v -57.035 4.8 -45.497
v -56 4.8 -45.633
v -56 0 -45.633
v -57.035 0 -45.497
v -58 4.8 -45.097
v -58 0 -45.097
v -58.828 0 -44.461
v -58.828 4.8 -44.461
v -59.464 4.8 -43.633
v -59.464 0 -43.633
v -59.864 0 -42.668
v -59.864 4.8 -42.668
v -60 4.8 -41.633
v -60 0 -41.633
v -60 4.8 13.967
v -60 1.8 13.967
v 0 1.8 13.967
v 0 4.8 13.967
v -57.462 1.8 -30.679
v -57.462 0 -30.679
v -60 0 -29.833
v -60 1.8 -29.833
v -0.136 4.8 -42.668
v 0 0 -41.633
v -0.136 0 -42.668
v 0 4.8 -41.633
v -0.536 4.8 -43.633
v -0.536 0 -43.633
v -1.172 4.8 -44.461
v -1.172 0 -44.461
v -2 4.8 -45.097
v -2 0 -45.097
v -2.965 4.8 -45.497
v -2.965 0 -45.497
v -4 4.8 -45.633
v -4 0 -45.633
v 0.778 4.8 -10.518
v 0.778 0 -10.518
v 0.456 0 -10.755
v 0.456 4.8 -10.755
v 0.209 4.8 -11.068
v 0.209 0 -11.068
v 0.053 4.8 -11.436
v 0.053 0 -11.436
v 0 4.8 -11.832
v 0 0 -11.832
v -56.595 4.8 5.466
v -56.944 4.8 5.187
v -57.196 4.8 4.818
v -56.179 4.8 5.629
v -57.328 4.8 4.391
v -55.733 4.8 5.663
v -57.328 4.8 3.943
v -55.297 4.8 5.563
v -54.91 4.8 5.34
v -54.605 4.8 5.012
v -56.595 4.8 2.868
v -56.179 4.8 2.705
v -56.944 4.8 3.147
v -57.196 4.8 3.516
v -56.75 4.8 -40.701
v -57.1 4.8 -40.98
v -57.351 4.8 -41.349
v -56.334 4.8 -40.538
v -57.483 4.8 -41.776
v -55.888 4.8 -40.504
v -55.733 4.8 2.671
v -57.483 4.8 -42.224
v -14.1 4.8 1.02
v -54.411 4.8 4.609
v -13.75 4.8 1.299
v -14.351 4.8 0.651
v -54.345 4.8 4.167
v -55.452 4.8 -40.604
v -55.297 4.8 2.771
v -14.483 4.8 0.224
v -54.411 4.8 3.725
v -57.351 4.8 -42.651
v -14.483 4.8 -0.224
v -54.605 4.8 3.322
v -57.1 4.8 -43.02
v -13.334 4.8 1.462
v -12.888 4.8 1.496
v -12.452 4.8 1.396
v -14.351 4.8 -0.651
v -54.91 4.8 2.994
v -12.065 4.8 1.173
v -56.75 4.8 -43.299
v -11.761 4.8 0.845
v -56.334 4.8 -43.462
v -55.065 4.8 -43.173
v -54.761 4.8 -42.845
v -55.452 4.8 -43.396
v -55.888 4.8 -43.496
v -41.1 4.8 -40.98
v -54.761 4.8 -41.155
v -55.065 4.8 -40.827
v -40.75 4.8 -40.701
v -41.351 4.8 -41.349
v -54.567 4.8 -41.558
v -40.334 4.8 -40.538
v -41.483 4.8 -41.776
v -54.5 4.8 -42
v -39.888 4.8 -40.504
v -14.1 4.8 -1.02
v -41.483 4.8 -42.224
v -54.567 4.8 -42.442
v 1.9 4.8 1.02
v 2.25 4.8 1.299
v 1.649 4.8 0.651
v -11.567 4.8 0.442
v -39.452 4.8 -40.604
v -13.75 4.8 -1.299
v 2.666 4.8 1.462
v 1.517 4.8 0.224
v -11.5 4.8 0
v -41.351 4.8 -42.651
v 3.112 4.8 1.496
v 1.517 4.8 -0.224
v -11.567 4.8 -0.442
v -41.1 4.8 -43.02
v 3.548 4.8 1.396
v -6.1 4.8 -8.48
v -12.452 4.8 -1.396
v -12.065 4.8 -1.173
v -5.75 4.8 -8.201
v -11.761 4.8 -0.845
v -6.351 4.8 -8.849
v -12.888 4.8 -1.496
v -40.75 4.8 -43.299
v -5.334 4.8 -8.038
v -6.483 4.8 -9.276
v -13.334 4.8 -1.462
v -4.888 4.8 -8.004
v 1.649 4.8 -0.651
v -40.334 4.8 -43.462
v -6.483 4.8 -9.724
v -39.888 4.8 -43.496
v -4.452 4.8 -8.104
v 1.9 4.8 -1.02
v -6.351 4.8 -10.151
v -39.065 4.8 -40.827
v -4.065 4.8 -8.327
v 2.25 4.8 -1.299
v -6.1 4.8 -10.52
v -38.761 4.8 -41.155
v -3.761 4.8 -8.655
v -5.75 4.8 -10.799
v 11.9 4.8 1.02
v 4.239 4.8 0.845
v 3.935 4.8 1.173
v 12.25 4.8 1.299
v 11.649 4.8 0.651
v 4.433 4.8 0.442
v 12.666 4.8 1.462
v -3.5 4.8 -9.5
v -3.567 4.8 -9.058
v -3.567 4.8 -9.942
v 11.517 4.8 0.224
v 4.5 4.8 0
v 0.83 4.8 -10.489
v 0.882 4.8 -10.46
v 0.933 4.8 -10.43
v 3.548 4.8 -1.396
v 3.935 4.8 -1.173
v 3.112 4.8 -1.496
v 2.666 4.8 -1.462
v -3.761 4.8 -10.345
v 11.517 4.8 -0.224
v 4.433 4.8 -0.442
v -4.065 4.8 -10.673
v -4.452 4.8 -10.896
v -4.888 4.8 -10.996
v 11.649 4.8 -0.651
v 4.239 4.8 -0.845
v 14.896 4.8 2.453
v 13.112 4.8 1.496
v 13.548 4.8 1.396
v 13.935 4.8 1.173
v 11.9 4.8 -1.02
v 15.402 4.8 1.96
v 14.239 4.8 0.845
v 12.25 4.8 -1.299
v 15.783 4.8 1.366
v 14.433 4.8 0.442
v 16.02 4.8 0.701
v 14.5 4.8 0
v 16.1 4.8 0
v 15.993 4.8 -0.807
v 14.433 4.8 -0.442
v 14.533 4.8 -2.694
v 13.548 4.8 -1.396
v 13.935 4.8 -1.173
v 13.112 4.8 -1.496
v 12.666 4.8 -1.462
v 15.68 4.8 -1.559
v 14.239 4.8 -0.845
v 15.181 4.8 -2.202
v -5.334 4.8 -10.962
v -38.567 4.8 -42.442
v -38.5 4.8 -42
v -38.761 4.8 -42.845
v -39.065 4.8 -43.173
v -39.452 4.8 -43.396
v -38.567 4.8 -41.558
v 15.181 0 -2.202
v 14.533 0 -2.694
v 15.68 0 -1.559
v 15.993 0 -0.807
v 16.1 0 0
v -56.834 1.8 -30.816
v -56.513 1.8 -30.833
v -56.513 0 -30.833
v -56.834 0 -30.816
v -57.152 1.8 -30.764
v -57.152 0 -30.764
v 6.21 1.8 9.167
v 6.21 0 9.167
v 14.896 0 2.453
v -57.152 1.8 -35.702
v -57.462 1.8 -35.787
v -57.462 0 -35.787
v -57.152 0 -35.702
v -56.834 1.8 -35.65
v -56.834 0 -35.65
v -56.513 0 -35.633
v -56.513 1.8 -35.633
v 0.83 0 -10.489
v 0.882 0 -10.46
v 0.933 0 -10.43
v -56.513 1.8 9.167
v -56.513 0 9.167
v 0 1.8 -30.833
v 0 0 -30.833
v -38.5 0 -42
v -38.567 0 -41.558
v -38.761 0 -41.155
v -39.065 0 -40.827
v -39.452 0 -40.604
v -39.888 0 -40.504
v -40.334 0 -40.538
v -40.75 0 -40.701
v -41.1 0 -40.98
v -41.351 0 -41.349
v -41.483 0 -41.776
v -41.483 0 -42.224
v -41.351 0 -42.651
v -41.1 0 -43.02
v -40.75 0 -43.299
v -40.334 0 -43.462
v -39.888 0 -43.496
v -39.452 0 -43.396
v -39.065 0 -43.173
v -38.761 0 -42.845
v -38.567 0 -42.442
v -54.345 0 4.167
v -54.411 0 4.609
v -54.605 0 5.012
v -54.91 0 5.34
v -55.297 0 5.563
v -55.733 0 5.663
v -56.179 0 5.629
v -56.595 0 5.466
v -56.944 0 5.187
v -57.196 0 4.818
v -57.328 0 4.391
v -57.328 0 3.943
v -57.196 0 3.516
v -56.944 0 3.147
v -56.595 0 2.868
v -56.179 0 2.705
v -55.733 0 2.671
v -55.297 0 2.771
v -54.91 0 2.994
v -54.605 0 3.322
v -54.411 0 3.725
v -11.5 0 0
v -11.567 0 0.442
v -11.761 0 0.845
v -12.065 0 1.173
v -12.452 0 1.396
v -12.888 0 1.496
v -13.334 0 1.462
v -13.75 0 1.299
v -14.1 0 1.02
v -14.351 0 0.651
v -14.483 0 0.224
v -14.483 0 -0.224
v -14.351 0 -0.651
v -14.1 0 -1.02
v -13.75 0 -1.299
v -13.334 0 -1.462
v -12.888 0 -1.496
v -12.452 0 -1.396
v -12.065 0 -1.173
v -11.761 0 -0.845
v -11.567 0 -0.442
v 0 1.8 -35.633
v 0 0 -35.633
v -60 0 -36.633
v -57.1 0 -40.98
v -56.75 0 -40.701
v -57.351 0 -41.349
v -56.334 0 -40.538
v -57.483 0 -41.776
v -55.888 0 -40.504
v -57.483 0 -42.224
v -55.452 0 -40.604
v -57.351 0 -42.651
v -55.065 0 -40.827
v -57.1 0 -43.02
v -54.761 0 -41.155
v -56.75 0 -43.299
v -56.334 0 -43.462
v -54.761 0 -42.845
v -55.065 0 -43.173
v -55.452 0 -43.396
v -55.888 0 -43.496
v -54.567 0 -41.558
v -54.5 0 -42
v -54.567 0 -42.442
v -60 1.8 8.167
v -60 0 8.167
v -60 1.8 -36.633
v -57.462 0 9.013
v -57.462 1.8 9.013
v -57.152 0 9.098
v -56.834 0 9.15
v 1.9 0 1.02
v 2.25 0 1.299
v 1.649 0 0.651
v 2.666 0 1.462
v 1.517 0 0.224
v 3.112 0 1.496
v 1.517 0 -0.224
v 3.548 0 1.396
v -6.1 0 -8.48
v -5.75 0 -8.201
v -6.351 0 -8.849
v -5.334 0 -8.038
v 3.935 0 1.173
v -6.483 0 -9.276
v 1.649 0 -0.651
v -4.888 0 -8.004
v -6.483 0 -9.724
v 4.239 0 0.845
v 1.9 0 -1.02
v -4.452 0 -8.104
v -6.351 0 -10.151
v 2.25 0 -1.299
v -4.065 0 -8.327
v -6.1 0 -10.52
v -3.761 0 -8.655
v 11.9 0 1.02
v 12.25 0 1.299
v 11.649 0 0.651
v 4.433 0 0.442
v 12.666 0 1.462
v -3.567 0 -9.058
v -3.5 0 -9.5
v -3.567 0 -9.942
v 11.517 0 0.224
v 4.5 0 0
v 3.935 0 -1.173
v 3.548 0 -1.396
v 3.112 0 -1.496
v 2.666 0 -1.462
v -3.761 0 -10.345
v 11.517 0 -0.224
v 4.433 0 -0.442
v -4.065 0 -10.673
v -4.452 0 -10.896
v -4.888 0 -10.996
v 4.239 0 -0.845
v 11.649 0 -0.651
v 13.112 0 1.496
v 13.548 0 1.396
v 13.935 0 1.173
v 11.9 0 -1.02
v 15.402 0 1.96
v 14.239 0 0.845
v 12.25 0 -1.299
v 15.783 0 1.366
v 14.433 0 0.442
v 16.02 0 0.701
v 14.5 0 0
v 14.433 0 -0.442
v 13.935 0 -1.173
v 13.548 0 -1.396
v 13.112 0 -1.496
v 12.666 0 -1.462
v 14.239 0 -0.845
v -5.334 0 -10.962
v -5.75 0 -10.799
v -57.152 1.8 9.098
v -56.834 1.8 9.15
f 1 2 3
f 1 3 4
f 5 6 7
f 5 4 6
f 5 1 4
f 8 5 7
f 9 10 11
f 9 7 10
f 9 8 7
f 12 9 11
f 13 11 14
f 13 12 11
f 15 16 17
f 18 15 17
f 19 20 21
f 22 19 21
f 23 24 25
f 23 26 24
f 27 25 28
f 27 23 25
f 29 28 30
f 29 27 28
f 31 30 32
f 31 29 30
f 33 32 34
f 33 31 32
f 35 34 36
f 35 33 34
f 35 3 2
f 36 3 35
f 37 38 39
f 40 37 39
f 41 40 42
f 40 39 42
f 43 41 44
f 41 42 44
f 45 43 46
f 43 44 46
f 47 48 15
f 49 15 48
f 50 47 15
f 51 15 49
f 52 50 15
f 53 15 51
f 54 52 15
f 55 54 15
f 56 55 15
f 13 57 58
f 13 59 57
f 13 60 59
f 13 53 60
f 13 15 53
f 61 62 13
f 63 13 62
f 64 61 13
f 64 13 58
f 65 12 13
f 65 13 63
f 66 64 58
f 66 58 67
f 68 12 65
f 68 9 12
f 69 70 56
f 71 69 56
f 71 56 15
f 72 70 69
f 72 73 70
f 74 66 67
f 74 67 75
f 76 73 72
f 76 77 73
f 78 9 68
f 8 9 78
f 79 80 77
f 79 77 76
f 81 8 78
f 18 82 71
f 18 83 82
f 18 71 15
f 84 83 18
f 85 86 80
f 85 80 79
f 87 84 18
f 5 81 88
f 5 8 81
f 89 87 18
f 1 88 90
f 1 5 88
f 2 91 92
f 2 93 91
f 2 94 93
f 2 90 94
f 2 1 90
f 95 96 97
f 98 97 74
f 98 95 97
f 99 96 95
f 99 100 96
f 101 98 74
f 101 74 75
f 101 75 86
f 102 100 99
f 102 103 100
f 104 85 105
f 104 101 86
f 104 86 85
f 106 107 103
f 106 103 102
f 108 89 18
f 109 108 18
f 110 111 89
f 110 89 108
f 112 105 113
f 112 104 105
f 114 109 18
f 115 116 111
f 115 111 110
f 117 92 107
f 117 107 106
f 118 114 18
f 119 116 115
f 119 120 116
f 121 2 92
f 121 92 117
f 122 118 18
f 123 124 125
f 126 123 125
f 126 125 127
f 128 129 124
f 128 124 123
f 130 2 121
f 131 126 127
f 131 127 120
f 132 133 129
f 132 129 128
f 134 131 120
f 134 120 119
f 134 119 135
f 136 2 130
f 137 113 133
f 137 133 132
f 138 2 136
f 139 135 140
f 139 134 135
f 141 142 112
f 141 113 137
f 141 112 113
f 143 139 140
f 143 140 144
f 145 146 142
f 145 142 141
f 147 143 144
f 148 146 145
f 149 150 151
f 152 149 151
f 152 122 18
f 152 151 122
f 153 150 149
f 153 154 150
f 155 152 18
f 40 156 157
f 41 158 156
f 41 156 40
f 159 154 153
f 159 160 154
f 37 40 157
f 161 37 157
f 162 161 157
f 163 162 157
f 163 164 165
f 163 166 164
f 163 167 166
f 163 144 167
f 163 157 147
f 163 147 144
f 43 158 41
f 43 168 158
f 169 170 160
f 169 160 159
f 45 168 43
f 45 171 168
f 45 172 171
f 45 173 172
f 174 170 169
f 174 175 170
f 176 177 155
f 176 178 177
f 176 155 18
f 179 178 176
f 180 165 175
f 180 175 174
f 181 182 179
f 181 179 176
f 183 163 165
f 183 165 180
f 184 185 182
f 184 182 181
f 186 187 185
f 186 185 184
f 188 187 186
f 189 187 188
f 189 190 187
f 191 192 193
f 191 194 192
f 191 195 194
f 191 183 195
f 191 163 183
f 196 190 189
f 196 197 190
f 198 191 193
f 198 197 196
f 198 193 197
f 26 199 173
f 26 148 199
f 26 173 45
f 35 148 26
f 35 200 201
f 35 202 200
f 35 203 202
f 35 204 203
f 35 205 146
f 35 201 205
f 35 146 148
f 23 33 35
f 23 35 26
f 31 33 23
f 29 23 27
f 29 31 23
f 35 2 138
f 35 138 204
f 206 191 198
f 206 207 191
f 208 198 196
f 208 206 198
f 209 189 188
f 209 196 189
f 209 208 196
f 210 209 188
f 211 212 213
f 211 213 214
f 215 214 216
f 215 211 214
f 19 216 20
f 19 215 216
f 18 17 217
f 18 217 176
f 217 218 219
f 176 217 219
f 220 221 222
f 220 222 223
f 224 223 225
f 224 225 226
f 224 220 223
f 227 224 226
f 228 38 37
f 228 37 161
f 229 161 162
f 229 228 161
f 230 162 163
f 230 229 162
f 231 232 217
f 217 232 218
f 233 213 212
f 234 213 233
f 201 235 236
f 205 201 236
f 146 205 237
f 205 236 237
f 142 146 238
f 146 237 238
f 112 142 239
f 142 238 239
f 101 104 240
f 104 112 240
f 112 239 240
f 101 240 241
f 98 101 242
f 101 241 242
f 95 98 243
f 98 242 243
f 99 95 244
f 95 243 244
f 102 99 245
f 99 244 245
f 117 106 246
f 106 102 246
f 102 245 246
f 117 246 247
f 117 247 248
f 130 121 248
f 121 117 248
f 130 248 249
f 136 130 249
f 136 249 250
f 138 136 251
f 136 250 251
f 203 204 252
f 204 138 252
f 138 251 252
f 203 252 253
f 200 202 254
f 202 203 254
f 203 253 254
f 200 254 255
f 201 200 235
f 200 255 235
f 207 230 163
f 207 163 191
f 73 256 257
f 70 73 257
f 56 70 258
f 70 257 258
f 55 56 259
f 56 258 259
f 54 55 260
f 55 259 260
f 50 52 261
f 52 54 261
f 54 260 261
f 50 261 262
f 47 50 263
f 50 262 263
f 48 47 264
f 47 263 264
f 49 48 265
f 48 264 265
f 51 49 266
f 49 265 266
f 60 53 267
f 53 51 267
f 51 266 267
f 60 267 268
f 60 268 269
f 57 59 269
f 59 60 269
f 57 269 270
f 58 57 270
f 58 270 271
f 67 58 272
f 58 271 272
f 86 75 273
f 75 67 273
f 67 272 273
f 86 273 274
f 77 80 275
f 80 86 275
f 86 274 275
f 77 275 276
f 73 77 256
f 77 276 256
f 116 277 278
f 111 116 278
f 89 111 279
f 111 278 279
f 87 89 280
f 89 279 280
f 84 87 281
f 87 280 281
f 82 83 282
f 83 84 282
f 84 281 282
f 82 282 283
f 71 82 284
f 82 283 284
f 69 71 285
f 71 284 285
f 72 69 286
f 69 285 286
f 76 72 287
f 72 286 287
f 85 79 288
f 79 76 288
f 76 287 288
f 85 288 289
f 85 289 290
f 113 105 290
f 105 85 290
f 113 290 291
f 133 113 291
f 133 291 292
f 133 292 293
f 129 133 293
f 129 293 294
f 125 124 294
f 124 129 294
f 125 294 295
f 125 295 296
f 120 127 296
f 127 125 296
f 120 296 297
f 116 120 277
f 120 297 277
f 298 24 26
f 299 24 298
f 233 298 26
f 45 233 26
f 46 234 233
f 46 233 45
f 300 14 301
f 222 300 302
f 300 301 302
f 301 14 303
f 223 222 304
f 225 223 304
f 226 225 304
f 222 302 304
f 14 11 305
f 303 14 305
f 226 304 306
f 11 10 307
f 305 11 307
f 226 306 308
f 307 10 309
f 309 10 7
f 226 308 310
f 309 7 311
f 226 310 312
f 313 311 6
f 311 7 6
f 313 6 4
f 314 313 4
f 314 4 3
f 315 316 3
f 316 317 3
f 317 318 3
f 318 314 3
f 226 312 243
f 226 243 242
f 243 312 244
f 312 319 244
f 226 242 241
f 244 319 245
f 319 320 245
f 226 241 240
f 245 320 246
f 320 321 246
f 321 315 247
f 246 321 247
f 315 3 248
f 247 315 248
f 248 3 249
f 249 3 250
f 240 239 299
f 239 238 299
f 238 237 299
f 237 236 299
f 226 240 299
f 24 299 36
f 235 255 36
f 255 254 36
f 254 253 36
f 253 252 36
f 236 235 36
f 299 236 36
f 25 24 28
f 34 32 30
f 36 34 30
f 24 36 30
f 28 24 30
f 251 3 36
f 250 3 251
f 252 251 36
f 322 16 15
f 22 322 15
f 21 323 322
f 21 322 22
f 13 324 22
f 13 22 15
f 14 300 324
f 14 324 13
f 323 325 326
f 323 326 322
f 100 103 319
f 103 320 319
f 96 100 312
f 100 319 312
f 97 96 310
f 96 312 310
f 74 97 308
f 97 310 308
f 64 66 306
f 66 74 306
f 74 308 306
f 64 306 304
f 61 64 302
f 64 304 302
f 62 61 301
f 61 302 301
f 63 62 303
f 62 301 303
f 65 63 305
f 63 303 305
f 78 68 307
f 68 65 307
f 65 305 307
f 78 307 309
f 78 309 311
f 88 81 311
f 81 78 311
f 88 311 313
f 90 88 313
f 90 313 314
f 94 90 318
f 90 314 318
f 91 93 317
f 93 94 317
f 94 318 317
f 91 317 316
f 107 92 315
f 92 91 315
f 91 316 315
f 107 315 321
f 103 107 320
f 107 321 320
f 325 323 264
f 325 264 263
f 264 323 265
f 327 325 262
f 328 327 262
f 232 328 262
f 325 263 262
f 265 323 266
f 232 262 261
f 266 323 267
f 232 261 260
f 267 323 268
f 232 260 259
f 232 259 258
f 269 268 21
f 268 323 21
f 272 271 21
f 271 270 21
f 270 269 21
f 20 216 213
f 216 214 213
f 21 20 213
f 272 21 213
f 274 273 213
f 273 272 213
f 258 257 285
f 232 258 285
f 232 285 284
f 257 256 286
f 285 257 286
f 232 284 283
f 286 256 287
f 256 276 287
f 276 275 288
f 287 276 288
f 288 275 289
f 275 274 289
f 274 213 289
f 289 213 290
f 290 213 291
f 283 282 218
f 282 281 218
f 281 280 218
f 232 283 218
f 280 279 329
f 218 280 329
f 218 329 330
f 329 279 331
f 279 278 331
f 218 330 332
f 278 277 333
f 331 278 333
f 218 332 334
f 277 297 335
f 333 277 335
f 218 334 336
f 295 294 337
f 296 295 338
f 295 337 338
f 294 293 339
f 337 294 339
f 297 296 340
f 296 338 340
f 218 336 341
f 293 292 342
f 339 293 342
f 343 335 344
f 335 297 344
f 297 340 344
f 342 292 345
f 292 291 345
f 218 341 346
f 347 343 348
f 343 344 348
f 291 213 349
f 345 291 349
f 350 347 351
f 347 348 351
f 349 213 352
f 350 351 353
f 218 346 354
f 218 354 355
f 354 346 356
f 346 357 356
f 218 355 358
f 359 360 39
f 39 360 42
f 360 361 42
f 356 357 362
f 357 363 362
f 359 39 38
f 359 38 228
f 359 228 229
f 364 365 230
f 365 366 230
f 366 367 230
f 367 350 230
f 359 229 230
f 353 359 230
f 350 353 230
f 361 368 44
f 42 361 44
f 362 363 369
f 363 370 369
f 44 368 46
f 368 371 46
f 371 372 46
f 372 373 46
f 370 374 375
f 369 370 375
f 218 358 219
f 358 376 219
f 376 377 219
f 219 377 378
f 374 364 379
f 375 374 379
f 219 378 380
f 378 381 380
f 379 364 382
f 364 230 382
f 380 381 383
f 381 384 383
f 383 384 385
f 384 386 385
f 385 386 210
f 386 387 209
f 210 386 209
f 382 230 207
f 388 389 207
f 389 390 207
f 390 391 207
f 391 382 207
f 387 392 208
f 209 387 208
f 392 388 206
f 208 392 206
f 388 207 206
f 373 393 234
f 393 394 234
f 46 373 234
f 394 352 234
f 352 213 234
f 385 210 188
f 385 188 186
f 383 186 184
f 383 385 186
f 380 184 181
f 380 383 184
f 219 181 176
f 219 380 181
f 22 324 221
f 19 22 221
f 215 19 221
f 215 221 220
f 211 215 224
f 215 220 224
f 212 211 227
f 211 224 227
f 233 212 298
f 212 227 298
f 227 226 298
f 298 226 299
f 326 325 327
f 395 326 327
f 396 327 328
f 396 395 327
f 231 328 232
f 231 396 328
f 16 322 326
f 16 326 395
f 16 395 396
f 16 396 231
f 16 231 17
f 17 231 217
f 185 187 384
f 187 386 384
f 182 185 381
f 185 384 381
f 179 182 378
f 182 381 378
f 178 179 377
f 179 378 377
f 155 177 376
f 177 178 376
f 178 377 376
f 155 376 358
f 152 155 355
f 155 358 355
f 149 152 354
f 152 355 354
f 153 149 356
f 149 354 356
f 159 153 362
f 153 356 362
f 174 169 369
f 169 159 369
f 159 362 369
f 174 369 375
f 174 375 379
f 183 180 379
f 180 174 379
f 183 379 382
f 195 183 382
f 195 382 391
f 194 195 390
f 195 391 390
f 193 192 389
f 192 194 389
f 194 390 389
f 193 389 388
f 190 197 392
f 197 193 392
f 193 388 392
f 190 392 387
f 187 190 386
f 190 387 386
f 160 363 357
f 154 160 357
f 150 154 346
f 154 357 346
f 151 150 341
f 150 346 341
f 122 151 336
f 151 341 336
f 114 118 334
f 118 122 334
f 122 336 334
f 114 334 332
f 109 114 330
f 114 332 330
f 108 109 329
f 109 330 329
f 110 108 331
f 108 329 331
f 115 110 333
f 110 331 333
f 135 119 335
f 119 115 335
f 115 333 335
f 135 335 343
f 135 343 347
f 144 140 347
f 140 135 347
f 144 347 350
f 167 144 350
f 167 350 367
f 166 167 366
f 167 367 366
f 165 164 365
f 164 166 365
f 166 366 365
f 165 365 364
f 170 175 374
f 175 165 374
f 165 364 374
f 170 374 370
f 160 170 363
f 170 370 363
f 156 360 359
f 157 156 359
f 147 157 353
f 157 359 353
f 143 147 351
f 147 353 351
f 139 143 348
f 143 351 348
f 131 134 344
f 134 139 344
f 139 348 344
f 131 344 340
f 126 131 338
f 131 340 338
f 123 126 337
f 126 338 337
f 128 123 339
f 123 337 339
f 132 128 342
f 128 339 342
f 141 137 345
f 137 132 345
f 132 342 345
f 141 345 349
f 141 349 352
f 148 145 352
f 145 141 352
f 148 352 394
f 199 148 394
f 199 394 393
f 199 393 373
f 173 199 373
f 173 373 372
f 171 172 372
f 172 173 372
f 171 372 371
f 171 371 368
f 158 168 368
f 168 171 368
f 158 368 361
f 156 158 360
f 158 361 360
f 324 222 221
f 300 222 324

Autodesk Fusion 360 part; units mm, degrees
sketch "Sketch1" plane through (0, 0, 0) normal (0, 1, 0) x (1, 0, 0)
  circle A0 centre (0, 0) radius 48 construction
  circle A1 centre (0, 0) radius 14 construction
  circle A2 centre (0, 0) radius 9.5 construction
  circle A3 centre (0, 0) radius 8 construction
  line L0 (0, 0) -> (8, 0) construction
  line L1 (0, 0) -> (0, -9.5) construction
  line L2 (0, 0) -> (-8, 0) construction
  line L3 (0, 0) -> (0, 9.5) construction
  circle A4 centre (8, 0) radius 1.5
  circle A5 centre (-8, 0) radius 1.5
  circle A6 centre (0, 9.5) radius 1.5
  circle A7 centre (0, 0) radius 12 construction
  line L4 (8, 0) -> (18, 0) construction
  line L5 (21.1, 0) -> (19.55, 2.6847) construction
  line L6 (19.55, 2.6847) -> (16.45, 2.6847) construction
  line L7 (16.45, 2.6847) -> (14.9, 0) construction
  line L8 (14.9, 0) -> (16.45, -2.6847) construction
  line L9 (16.45, -2.6847) -> (19.55, -2.6847) construction
  line L10 (19.55, -2.6847) -> (21.1, 0) construction
  circle A8 centre (18, 0) radius 3.1 construction
  circle A9 centre (18, 0) radius 1.5
  line L11 (0, 52) -> (-68, 52) construction
  line L12 (-9.7468, 47) -> (-68, 47) construction
  line L13 (-68, 52) -> (-68, 47) construction
  line L14 (-68, 47) -> (-68, 35.633) construction
  line L15 (-68, 35.633) -> (-32.1604, 35.633) construction
  line L16 (-68, 35.633) -> (-68, 30.833) construction
  line L17 (-68, 30.833) -> (-36.7876, 30.833) construction
  line L18 (-68, 30.833) -> (-68, -9.167) construction
  line L19 (-60, -9.167) -> (-47.1165, -9.167)
  line L20 (-68, -9.167) -> (-68, -13.967) construction
  line L21 (-68, -13.967) -> (-45.923, -13.967) construction
  line L22 (-60, -13.967) -> (-60, 35.633)
  line L23 (5.9333, 10.4305) -> (19.5328, 2.6945)
  line L24 (-60, -13.967) -> (21.1, -13.967)
  line L25 (21.1, -13.967) -> (21.1, 0)
  arc A10 (21.1, 0) -> (19.5328, 2.6945) centre (18, 0) ccw
  line L26 (-57, 35.633) -> (5, 35.633)
  line L27 (5, 35.633) -> (5, 11.8322)
  arc A11 (5.9333, 10.4305) -> (5.7778, 10.5175) centre (0, 0) ccw
  arc A12 (5, 11.8322) -> (5.7778, 10.5175) centre (6.5, 11.8322) ccw
  arc A13 (5.7778, 10.5175) -> (7.9656, 11.513) centre (6.5, 11.8322) ccw construction
  arc A14 (5.4445, 12.898) -> (5, 11.8322) centre (6.5, 11.8322) ccw construction
  arc A15 (7.9656, 11.513) -> (5.4445, 12.898) centre (6.5, 11.8322) ccw construction
  line L28 (5, 11.8322) -> (5, 10.9087) construction
  arc A16 (5.7778, 10.5175) -> (5, 10.9087) centre (0, 0) ccw construction
  line L29 (-57, 30.833) -> (5, 30.833)
  line L30 (-47.1165, -9.167) -> (21.1, -9.167)
  line L31 (-60, 35.633) -> (-60, 45.633)
  line L32 (-60, 45.633) -> (5, 45.633)
  line L33 (5, 45.633) -> (5, 35.633)
  circle A17 centre (-56, 42) radius 1.5
  circle A18 centre (-40, 42) radius 1.5
  line L34 (-40, 42) -> (0, 0) construction
  circle A19 centre (-55.8448, -4.167) radius 1.5
  line L35 (0, 0) -> (-55.8448, -4.167) construction
  line L36 (-68, -9.167) -> (-60, -9.167) construction
  line L37 (-57, -9.167) -> (-60, -8.167)
  line L38 (-57, -9.167) -> (-57, 30.833) construction
  line L39 (-57, 30.833) -> (-57, 35.633) construction
  line L40 (-57, 30.833) -> (-60, 29.833)
  line L41 (-57, 35.633) -> (-60, 36.633)
  line L42 (-60, 35.633) -> (-57, 35.633) construction
  line L43 (-60, 30.833) -> (-57, 30.833) construction
  line L44 (5, 11.8322) -> (5, -13.967) construction
  line L45 (5, -13.967) -> (19.8959, -2.4527)
  line L46 (18, 0) -> (19.8959, -2.4527) construction
  line L47 (18, 0) -> (21.1, 0) construction
  arc A20 (19.8959, -2.4527) -> (21.1, 0) centre (18, 0) ccw
  point P0 (18, 0)
  point P1 (-33.1034, 34.7586)
  point P2 (-47.8669, -3.5717)
  dimension "d1" = 96
  dimension "d2" = 28
  dimension "d3" = 19
  dimension "d4" = 16
  dimension "d5" = 3
  dimension "d6" = 3
  dimension "d7" = 3
  dimension "d8" = 24
  dimension "d9" = 18
  dimension "d10" = 3.1
  dimension "d11" = 60
  dimension "d12" = 3
  dimension "d13" = 52
  dimension "d14" = 68
  dimension "d15" = 68
  dimension "d18" = 5
  dimension "d22" = 16.367
  dimension "d23" = 4.8
  dimension "d24" = 40
  dimension "d25" = 4.8
  dimension "d26" = 8
  dimension "d27" = 3.1
  dimension "d28" = 5
  dimension "d33" = 12
  dimension "d34" = 3
  dimension "d35" = 10
  dimension "d36" = 3
  dimension "d37" = 12
  dimension "d38" = 5
  dimension "d39" = 3
  dimension "d40" = 5
  dimension "d41" = 10
  dimension "d42" = 3
  dimension "d43" = 5
  dimension "d44" = 8
  dimension "d54" = 1
  dimension "d55" = 3
  dimension "d56" = 1
  dimension "d57" = 1
  dimension "d60" = 3.1
extrude "Extrude1" add sketch "Sketch1" along normal blind 4.8 contours L19 L22 L37 | L19 L22 L24 L30 L45 | L19 L22 L23 A10 L27 A11 A12 L29 L30 L37 L40 L45 A20 | L22 L26 L27 L29 L31 L40 L41 | L26 L31 L32 L33 L41 makes body 1
fillet "Fillet1" radius 4 2 edges at (5, 2.4, -45.633) (-60, 2.4, -45.633) on bodies 1
extrude "Extrude2" cut sketch "Sketch1" along normal blind 1.8 contours L19 L22 L37 | L19 L22 L24 L30 L45 | L24 L25 L30 L45 | L22 L26 L27 L29 L31 L40 L41 bodies 1
fillet "Fillet2" radius 3 3 edges at (-57, 0.9, -35.633) (-57, 0.9, -30.833) (-57, 0.9, 9.167) on bodies 1
ref_plane "WorkPlane1" through (-30, 0, 0) normal (1, 0, 0) x (0, 1, 0)
ref_plane "WorkPlane2" through (-25, 0, 0) normal (1, 0, 0) x (0, 1, 0)
split "Split1" by plane through (-30, 0, 0) normal (1, 0, 0) bodies 1 makes body 2 at (-9.9784, 4.8, -33.9796)
split "Split2" by plane through (-25, 0, 0) normal (1, 0, 0) bodies 2 makes body 3 at (-8.25, 4.8, -34.0217)
delete_body "RemoveBody1" bodies 2
move_body "Move1" bodies 3 to x (1, 0, 0) y (0, 1, 0) z (0, 0, 1) at (-5, 0, 0)
combine "Combine1" operation add target body 1 tool bodies 3
